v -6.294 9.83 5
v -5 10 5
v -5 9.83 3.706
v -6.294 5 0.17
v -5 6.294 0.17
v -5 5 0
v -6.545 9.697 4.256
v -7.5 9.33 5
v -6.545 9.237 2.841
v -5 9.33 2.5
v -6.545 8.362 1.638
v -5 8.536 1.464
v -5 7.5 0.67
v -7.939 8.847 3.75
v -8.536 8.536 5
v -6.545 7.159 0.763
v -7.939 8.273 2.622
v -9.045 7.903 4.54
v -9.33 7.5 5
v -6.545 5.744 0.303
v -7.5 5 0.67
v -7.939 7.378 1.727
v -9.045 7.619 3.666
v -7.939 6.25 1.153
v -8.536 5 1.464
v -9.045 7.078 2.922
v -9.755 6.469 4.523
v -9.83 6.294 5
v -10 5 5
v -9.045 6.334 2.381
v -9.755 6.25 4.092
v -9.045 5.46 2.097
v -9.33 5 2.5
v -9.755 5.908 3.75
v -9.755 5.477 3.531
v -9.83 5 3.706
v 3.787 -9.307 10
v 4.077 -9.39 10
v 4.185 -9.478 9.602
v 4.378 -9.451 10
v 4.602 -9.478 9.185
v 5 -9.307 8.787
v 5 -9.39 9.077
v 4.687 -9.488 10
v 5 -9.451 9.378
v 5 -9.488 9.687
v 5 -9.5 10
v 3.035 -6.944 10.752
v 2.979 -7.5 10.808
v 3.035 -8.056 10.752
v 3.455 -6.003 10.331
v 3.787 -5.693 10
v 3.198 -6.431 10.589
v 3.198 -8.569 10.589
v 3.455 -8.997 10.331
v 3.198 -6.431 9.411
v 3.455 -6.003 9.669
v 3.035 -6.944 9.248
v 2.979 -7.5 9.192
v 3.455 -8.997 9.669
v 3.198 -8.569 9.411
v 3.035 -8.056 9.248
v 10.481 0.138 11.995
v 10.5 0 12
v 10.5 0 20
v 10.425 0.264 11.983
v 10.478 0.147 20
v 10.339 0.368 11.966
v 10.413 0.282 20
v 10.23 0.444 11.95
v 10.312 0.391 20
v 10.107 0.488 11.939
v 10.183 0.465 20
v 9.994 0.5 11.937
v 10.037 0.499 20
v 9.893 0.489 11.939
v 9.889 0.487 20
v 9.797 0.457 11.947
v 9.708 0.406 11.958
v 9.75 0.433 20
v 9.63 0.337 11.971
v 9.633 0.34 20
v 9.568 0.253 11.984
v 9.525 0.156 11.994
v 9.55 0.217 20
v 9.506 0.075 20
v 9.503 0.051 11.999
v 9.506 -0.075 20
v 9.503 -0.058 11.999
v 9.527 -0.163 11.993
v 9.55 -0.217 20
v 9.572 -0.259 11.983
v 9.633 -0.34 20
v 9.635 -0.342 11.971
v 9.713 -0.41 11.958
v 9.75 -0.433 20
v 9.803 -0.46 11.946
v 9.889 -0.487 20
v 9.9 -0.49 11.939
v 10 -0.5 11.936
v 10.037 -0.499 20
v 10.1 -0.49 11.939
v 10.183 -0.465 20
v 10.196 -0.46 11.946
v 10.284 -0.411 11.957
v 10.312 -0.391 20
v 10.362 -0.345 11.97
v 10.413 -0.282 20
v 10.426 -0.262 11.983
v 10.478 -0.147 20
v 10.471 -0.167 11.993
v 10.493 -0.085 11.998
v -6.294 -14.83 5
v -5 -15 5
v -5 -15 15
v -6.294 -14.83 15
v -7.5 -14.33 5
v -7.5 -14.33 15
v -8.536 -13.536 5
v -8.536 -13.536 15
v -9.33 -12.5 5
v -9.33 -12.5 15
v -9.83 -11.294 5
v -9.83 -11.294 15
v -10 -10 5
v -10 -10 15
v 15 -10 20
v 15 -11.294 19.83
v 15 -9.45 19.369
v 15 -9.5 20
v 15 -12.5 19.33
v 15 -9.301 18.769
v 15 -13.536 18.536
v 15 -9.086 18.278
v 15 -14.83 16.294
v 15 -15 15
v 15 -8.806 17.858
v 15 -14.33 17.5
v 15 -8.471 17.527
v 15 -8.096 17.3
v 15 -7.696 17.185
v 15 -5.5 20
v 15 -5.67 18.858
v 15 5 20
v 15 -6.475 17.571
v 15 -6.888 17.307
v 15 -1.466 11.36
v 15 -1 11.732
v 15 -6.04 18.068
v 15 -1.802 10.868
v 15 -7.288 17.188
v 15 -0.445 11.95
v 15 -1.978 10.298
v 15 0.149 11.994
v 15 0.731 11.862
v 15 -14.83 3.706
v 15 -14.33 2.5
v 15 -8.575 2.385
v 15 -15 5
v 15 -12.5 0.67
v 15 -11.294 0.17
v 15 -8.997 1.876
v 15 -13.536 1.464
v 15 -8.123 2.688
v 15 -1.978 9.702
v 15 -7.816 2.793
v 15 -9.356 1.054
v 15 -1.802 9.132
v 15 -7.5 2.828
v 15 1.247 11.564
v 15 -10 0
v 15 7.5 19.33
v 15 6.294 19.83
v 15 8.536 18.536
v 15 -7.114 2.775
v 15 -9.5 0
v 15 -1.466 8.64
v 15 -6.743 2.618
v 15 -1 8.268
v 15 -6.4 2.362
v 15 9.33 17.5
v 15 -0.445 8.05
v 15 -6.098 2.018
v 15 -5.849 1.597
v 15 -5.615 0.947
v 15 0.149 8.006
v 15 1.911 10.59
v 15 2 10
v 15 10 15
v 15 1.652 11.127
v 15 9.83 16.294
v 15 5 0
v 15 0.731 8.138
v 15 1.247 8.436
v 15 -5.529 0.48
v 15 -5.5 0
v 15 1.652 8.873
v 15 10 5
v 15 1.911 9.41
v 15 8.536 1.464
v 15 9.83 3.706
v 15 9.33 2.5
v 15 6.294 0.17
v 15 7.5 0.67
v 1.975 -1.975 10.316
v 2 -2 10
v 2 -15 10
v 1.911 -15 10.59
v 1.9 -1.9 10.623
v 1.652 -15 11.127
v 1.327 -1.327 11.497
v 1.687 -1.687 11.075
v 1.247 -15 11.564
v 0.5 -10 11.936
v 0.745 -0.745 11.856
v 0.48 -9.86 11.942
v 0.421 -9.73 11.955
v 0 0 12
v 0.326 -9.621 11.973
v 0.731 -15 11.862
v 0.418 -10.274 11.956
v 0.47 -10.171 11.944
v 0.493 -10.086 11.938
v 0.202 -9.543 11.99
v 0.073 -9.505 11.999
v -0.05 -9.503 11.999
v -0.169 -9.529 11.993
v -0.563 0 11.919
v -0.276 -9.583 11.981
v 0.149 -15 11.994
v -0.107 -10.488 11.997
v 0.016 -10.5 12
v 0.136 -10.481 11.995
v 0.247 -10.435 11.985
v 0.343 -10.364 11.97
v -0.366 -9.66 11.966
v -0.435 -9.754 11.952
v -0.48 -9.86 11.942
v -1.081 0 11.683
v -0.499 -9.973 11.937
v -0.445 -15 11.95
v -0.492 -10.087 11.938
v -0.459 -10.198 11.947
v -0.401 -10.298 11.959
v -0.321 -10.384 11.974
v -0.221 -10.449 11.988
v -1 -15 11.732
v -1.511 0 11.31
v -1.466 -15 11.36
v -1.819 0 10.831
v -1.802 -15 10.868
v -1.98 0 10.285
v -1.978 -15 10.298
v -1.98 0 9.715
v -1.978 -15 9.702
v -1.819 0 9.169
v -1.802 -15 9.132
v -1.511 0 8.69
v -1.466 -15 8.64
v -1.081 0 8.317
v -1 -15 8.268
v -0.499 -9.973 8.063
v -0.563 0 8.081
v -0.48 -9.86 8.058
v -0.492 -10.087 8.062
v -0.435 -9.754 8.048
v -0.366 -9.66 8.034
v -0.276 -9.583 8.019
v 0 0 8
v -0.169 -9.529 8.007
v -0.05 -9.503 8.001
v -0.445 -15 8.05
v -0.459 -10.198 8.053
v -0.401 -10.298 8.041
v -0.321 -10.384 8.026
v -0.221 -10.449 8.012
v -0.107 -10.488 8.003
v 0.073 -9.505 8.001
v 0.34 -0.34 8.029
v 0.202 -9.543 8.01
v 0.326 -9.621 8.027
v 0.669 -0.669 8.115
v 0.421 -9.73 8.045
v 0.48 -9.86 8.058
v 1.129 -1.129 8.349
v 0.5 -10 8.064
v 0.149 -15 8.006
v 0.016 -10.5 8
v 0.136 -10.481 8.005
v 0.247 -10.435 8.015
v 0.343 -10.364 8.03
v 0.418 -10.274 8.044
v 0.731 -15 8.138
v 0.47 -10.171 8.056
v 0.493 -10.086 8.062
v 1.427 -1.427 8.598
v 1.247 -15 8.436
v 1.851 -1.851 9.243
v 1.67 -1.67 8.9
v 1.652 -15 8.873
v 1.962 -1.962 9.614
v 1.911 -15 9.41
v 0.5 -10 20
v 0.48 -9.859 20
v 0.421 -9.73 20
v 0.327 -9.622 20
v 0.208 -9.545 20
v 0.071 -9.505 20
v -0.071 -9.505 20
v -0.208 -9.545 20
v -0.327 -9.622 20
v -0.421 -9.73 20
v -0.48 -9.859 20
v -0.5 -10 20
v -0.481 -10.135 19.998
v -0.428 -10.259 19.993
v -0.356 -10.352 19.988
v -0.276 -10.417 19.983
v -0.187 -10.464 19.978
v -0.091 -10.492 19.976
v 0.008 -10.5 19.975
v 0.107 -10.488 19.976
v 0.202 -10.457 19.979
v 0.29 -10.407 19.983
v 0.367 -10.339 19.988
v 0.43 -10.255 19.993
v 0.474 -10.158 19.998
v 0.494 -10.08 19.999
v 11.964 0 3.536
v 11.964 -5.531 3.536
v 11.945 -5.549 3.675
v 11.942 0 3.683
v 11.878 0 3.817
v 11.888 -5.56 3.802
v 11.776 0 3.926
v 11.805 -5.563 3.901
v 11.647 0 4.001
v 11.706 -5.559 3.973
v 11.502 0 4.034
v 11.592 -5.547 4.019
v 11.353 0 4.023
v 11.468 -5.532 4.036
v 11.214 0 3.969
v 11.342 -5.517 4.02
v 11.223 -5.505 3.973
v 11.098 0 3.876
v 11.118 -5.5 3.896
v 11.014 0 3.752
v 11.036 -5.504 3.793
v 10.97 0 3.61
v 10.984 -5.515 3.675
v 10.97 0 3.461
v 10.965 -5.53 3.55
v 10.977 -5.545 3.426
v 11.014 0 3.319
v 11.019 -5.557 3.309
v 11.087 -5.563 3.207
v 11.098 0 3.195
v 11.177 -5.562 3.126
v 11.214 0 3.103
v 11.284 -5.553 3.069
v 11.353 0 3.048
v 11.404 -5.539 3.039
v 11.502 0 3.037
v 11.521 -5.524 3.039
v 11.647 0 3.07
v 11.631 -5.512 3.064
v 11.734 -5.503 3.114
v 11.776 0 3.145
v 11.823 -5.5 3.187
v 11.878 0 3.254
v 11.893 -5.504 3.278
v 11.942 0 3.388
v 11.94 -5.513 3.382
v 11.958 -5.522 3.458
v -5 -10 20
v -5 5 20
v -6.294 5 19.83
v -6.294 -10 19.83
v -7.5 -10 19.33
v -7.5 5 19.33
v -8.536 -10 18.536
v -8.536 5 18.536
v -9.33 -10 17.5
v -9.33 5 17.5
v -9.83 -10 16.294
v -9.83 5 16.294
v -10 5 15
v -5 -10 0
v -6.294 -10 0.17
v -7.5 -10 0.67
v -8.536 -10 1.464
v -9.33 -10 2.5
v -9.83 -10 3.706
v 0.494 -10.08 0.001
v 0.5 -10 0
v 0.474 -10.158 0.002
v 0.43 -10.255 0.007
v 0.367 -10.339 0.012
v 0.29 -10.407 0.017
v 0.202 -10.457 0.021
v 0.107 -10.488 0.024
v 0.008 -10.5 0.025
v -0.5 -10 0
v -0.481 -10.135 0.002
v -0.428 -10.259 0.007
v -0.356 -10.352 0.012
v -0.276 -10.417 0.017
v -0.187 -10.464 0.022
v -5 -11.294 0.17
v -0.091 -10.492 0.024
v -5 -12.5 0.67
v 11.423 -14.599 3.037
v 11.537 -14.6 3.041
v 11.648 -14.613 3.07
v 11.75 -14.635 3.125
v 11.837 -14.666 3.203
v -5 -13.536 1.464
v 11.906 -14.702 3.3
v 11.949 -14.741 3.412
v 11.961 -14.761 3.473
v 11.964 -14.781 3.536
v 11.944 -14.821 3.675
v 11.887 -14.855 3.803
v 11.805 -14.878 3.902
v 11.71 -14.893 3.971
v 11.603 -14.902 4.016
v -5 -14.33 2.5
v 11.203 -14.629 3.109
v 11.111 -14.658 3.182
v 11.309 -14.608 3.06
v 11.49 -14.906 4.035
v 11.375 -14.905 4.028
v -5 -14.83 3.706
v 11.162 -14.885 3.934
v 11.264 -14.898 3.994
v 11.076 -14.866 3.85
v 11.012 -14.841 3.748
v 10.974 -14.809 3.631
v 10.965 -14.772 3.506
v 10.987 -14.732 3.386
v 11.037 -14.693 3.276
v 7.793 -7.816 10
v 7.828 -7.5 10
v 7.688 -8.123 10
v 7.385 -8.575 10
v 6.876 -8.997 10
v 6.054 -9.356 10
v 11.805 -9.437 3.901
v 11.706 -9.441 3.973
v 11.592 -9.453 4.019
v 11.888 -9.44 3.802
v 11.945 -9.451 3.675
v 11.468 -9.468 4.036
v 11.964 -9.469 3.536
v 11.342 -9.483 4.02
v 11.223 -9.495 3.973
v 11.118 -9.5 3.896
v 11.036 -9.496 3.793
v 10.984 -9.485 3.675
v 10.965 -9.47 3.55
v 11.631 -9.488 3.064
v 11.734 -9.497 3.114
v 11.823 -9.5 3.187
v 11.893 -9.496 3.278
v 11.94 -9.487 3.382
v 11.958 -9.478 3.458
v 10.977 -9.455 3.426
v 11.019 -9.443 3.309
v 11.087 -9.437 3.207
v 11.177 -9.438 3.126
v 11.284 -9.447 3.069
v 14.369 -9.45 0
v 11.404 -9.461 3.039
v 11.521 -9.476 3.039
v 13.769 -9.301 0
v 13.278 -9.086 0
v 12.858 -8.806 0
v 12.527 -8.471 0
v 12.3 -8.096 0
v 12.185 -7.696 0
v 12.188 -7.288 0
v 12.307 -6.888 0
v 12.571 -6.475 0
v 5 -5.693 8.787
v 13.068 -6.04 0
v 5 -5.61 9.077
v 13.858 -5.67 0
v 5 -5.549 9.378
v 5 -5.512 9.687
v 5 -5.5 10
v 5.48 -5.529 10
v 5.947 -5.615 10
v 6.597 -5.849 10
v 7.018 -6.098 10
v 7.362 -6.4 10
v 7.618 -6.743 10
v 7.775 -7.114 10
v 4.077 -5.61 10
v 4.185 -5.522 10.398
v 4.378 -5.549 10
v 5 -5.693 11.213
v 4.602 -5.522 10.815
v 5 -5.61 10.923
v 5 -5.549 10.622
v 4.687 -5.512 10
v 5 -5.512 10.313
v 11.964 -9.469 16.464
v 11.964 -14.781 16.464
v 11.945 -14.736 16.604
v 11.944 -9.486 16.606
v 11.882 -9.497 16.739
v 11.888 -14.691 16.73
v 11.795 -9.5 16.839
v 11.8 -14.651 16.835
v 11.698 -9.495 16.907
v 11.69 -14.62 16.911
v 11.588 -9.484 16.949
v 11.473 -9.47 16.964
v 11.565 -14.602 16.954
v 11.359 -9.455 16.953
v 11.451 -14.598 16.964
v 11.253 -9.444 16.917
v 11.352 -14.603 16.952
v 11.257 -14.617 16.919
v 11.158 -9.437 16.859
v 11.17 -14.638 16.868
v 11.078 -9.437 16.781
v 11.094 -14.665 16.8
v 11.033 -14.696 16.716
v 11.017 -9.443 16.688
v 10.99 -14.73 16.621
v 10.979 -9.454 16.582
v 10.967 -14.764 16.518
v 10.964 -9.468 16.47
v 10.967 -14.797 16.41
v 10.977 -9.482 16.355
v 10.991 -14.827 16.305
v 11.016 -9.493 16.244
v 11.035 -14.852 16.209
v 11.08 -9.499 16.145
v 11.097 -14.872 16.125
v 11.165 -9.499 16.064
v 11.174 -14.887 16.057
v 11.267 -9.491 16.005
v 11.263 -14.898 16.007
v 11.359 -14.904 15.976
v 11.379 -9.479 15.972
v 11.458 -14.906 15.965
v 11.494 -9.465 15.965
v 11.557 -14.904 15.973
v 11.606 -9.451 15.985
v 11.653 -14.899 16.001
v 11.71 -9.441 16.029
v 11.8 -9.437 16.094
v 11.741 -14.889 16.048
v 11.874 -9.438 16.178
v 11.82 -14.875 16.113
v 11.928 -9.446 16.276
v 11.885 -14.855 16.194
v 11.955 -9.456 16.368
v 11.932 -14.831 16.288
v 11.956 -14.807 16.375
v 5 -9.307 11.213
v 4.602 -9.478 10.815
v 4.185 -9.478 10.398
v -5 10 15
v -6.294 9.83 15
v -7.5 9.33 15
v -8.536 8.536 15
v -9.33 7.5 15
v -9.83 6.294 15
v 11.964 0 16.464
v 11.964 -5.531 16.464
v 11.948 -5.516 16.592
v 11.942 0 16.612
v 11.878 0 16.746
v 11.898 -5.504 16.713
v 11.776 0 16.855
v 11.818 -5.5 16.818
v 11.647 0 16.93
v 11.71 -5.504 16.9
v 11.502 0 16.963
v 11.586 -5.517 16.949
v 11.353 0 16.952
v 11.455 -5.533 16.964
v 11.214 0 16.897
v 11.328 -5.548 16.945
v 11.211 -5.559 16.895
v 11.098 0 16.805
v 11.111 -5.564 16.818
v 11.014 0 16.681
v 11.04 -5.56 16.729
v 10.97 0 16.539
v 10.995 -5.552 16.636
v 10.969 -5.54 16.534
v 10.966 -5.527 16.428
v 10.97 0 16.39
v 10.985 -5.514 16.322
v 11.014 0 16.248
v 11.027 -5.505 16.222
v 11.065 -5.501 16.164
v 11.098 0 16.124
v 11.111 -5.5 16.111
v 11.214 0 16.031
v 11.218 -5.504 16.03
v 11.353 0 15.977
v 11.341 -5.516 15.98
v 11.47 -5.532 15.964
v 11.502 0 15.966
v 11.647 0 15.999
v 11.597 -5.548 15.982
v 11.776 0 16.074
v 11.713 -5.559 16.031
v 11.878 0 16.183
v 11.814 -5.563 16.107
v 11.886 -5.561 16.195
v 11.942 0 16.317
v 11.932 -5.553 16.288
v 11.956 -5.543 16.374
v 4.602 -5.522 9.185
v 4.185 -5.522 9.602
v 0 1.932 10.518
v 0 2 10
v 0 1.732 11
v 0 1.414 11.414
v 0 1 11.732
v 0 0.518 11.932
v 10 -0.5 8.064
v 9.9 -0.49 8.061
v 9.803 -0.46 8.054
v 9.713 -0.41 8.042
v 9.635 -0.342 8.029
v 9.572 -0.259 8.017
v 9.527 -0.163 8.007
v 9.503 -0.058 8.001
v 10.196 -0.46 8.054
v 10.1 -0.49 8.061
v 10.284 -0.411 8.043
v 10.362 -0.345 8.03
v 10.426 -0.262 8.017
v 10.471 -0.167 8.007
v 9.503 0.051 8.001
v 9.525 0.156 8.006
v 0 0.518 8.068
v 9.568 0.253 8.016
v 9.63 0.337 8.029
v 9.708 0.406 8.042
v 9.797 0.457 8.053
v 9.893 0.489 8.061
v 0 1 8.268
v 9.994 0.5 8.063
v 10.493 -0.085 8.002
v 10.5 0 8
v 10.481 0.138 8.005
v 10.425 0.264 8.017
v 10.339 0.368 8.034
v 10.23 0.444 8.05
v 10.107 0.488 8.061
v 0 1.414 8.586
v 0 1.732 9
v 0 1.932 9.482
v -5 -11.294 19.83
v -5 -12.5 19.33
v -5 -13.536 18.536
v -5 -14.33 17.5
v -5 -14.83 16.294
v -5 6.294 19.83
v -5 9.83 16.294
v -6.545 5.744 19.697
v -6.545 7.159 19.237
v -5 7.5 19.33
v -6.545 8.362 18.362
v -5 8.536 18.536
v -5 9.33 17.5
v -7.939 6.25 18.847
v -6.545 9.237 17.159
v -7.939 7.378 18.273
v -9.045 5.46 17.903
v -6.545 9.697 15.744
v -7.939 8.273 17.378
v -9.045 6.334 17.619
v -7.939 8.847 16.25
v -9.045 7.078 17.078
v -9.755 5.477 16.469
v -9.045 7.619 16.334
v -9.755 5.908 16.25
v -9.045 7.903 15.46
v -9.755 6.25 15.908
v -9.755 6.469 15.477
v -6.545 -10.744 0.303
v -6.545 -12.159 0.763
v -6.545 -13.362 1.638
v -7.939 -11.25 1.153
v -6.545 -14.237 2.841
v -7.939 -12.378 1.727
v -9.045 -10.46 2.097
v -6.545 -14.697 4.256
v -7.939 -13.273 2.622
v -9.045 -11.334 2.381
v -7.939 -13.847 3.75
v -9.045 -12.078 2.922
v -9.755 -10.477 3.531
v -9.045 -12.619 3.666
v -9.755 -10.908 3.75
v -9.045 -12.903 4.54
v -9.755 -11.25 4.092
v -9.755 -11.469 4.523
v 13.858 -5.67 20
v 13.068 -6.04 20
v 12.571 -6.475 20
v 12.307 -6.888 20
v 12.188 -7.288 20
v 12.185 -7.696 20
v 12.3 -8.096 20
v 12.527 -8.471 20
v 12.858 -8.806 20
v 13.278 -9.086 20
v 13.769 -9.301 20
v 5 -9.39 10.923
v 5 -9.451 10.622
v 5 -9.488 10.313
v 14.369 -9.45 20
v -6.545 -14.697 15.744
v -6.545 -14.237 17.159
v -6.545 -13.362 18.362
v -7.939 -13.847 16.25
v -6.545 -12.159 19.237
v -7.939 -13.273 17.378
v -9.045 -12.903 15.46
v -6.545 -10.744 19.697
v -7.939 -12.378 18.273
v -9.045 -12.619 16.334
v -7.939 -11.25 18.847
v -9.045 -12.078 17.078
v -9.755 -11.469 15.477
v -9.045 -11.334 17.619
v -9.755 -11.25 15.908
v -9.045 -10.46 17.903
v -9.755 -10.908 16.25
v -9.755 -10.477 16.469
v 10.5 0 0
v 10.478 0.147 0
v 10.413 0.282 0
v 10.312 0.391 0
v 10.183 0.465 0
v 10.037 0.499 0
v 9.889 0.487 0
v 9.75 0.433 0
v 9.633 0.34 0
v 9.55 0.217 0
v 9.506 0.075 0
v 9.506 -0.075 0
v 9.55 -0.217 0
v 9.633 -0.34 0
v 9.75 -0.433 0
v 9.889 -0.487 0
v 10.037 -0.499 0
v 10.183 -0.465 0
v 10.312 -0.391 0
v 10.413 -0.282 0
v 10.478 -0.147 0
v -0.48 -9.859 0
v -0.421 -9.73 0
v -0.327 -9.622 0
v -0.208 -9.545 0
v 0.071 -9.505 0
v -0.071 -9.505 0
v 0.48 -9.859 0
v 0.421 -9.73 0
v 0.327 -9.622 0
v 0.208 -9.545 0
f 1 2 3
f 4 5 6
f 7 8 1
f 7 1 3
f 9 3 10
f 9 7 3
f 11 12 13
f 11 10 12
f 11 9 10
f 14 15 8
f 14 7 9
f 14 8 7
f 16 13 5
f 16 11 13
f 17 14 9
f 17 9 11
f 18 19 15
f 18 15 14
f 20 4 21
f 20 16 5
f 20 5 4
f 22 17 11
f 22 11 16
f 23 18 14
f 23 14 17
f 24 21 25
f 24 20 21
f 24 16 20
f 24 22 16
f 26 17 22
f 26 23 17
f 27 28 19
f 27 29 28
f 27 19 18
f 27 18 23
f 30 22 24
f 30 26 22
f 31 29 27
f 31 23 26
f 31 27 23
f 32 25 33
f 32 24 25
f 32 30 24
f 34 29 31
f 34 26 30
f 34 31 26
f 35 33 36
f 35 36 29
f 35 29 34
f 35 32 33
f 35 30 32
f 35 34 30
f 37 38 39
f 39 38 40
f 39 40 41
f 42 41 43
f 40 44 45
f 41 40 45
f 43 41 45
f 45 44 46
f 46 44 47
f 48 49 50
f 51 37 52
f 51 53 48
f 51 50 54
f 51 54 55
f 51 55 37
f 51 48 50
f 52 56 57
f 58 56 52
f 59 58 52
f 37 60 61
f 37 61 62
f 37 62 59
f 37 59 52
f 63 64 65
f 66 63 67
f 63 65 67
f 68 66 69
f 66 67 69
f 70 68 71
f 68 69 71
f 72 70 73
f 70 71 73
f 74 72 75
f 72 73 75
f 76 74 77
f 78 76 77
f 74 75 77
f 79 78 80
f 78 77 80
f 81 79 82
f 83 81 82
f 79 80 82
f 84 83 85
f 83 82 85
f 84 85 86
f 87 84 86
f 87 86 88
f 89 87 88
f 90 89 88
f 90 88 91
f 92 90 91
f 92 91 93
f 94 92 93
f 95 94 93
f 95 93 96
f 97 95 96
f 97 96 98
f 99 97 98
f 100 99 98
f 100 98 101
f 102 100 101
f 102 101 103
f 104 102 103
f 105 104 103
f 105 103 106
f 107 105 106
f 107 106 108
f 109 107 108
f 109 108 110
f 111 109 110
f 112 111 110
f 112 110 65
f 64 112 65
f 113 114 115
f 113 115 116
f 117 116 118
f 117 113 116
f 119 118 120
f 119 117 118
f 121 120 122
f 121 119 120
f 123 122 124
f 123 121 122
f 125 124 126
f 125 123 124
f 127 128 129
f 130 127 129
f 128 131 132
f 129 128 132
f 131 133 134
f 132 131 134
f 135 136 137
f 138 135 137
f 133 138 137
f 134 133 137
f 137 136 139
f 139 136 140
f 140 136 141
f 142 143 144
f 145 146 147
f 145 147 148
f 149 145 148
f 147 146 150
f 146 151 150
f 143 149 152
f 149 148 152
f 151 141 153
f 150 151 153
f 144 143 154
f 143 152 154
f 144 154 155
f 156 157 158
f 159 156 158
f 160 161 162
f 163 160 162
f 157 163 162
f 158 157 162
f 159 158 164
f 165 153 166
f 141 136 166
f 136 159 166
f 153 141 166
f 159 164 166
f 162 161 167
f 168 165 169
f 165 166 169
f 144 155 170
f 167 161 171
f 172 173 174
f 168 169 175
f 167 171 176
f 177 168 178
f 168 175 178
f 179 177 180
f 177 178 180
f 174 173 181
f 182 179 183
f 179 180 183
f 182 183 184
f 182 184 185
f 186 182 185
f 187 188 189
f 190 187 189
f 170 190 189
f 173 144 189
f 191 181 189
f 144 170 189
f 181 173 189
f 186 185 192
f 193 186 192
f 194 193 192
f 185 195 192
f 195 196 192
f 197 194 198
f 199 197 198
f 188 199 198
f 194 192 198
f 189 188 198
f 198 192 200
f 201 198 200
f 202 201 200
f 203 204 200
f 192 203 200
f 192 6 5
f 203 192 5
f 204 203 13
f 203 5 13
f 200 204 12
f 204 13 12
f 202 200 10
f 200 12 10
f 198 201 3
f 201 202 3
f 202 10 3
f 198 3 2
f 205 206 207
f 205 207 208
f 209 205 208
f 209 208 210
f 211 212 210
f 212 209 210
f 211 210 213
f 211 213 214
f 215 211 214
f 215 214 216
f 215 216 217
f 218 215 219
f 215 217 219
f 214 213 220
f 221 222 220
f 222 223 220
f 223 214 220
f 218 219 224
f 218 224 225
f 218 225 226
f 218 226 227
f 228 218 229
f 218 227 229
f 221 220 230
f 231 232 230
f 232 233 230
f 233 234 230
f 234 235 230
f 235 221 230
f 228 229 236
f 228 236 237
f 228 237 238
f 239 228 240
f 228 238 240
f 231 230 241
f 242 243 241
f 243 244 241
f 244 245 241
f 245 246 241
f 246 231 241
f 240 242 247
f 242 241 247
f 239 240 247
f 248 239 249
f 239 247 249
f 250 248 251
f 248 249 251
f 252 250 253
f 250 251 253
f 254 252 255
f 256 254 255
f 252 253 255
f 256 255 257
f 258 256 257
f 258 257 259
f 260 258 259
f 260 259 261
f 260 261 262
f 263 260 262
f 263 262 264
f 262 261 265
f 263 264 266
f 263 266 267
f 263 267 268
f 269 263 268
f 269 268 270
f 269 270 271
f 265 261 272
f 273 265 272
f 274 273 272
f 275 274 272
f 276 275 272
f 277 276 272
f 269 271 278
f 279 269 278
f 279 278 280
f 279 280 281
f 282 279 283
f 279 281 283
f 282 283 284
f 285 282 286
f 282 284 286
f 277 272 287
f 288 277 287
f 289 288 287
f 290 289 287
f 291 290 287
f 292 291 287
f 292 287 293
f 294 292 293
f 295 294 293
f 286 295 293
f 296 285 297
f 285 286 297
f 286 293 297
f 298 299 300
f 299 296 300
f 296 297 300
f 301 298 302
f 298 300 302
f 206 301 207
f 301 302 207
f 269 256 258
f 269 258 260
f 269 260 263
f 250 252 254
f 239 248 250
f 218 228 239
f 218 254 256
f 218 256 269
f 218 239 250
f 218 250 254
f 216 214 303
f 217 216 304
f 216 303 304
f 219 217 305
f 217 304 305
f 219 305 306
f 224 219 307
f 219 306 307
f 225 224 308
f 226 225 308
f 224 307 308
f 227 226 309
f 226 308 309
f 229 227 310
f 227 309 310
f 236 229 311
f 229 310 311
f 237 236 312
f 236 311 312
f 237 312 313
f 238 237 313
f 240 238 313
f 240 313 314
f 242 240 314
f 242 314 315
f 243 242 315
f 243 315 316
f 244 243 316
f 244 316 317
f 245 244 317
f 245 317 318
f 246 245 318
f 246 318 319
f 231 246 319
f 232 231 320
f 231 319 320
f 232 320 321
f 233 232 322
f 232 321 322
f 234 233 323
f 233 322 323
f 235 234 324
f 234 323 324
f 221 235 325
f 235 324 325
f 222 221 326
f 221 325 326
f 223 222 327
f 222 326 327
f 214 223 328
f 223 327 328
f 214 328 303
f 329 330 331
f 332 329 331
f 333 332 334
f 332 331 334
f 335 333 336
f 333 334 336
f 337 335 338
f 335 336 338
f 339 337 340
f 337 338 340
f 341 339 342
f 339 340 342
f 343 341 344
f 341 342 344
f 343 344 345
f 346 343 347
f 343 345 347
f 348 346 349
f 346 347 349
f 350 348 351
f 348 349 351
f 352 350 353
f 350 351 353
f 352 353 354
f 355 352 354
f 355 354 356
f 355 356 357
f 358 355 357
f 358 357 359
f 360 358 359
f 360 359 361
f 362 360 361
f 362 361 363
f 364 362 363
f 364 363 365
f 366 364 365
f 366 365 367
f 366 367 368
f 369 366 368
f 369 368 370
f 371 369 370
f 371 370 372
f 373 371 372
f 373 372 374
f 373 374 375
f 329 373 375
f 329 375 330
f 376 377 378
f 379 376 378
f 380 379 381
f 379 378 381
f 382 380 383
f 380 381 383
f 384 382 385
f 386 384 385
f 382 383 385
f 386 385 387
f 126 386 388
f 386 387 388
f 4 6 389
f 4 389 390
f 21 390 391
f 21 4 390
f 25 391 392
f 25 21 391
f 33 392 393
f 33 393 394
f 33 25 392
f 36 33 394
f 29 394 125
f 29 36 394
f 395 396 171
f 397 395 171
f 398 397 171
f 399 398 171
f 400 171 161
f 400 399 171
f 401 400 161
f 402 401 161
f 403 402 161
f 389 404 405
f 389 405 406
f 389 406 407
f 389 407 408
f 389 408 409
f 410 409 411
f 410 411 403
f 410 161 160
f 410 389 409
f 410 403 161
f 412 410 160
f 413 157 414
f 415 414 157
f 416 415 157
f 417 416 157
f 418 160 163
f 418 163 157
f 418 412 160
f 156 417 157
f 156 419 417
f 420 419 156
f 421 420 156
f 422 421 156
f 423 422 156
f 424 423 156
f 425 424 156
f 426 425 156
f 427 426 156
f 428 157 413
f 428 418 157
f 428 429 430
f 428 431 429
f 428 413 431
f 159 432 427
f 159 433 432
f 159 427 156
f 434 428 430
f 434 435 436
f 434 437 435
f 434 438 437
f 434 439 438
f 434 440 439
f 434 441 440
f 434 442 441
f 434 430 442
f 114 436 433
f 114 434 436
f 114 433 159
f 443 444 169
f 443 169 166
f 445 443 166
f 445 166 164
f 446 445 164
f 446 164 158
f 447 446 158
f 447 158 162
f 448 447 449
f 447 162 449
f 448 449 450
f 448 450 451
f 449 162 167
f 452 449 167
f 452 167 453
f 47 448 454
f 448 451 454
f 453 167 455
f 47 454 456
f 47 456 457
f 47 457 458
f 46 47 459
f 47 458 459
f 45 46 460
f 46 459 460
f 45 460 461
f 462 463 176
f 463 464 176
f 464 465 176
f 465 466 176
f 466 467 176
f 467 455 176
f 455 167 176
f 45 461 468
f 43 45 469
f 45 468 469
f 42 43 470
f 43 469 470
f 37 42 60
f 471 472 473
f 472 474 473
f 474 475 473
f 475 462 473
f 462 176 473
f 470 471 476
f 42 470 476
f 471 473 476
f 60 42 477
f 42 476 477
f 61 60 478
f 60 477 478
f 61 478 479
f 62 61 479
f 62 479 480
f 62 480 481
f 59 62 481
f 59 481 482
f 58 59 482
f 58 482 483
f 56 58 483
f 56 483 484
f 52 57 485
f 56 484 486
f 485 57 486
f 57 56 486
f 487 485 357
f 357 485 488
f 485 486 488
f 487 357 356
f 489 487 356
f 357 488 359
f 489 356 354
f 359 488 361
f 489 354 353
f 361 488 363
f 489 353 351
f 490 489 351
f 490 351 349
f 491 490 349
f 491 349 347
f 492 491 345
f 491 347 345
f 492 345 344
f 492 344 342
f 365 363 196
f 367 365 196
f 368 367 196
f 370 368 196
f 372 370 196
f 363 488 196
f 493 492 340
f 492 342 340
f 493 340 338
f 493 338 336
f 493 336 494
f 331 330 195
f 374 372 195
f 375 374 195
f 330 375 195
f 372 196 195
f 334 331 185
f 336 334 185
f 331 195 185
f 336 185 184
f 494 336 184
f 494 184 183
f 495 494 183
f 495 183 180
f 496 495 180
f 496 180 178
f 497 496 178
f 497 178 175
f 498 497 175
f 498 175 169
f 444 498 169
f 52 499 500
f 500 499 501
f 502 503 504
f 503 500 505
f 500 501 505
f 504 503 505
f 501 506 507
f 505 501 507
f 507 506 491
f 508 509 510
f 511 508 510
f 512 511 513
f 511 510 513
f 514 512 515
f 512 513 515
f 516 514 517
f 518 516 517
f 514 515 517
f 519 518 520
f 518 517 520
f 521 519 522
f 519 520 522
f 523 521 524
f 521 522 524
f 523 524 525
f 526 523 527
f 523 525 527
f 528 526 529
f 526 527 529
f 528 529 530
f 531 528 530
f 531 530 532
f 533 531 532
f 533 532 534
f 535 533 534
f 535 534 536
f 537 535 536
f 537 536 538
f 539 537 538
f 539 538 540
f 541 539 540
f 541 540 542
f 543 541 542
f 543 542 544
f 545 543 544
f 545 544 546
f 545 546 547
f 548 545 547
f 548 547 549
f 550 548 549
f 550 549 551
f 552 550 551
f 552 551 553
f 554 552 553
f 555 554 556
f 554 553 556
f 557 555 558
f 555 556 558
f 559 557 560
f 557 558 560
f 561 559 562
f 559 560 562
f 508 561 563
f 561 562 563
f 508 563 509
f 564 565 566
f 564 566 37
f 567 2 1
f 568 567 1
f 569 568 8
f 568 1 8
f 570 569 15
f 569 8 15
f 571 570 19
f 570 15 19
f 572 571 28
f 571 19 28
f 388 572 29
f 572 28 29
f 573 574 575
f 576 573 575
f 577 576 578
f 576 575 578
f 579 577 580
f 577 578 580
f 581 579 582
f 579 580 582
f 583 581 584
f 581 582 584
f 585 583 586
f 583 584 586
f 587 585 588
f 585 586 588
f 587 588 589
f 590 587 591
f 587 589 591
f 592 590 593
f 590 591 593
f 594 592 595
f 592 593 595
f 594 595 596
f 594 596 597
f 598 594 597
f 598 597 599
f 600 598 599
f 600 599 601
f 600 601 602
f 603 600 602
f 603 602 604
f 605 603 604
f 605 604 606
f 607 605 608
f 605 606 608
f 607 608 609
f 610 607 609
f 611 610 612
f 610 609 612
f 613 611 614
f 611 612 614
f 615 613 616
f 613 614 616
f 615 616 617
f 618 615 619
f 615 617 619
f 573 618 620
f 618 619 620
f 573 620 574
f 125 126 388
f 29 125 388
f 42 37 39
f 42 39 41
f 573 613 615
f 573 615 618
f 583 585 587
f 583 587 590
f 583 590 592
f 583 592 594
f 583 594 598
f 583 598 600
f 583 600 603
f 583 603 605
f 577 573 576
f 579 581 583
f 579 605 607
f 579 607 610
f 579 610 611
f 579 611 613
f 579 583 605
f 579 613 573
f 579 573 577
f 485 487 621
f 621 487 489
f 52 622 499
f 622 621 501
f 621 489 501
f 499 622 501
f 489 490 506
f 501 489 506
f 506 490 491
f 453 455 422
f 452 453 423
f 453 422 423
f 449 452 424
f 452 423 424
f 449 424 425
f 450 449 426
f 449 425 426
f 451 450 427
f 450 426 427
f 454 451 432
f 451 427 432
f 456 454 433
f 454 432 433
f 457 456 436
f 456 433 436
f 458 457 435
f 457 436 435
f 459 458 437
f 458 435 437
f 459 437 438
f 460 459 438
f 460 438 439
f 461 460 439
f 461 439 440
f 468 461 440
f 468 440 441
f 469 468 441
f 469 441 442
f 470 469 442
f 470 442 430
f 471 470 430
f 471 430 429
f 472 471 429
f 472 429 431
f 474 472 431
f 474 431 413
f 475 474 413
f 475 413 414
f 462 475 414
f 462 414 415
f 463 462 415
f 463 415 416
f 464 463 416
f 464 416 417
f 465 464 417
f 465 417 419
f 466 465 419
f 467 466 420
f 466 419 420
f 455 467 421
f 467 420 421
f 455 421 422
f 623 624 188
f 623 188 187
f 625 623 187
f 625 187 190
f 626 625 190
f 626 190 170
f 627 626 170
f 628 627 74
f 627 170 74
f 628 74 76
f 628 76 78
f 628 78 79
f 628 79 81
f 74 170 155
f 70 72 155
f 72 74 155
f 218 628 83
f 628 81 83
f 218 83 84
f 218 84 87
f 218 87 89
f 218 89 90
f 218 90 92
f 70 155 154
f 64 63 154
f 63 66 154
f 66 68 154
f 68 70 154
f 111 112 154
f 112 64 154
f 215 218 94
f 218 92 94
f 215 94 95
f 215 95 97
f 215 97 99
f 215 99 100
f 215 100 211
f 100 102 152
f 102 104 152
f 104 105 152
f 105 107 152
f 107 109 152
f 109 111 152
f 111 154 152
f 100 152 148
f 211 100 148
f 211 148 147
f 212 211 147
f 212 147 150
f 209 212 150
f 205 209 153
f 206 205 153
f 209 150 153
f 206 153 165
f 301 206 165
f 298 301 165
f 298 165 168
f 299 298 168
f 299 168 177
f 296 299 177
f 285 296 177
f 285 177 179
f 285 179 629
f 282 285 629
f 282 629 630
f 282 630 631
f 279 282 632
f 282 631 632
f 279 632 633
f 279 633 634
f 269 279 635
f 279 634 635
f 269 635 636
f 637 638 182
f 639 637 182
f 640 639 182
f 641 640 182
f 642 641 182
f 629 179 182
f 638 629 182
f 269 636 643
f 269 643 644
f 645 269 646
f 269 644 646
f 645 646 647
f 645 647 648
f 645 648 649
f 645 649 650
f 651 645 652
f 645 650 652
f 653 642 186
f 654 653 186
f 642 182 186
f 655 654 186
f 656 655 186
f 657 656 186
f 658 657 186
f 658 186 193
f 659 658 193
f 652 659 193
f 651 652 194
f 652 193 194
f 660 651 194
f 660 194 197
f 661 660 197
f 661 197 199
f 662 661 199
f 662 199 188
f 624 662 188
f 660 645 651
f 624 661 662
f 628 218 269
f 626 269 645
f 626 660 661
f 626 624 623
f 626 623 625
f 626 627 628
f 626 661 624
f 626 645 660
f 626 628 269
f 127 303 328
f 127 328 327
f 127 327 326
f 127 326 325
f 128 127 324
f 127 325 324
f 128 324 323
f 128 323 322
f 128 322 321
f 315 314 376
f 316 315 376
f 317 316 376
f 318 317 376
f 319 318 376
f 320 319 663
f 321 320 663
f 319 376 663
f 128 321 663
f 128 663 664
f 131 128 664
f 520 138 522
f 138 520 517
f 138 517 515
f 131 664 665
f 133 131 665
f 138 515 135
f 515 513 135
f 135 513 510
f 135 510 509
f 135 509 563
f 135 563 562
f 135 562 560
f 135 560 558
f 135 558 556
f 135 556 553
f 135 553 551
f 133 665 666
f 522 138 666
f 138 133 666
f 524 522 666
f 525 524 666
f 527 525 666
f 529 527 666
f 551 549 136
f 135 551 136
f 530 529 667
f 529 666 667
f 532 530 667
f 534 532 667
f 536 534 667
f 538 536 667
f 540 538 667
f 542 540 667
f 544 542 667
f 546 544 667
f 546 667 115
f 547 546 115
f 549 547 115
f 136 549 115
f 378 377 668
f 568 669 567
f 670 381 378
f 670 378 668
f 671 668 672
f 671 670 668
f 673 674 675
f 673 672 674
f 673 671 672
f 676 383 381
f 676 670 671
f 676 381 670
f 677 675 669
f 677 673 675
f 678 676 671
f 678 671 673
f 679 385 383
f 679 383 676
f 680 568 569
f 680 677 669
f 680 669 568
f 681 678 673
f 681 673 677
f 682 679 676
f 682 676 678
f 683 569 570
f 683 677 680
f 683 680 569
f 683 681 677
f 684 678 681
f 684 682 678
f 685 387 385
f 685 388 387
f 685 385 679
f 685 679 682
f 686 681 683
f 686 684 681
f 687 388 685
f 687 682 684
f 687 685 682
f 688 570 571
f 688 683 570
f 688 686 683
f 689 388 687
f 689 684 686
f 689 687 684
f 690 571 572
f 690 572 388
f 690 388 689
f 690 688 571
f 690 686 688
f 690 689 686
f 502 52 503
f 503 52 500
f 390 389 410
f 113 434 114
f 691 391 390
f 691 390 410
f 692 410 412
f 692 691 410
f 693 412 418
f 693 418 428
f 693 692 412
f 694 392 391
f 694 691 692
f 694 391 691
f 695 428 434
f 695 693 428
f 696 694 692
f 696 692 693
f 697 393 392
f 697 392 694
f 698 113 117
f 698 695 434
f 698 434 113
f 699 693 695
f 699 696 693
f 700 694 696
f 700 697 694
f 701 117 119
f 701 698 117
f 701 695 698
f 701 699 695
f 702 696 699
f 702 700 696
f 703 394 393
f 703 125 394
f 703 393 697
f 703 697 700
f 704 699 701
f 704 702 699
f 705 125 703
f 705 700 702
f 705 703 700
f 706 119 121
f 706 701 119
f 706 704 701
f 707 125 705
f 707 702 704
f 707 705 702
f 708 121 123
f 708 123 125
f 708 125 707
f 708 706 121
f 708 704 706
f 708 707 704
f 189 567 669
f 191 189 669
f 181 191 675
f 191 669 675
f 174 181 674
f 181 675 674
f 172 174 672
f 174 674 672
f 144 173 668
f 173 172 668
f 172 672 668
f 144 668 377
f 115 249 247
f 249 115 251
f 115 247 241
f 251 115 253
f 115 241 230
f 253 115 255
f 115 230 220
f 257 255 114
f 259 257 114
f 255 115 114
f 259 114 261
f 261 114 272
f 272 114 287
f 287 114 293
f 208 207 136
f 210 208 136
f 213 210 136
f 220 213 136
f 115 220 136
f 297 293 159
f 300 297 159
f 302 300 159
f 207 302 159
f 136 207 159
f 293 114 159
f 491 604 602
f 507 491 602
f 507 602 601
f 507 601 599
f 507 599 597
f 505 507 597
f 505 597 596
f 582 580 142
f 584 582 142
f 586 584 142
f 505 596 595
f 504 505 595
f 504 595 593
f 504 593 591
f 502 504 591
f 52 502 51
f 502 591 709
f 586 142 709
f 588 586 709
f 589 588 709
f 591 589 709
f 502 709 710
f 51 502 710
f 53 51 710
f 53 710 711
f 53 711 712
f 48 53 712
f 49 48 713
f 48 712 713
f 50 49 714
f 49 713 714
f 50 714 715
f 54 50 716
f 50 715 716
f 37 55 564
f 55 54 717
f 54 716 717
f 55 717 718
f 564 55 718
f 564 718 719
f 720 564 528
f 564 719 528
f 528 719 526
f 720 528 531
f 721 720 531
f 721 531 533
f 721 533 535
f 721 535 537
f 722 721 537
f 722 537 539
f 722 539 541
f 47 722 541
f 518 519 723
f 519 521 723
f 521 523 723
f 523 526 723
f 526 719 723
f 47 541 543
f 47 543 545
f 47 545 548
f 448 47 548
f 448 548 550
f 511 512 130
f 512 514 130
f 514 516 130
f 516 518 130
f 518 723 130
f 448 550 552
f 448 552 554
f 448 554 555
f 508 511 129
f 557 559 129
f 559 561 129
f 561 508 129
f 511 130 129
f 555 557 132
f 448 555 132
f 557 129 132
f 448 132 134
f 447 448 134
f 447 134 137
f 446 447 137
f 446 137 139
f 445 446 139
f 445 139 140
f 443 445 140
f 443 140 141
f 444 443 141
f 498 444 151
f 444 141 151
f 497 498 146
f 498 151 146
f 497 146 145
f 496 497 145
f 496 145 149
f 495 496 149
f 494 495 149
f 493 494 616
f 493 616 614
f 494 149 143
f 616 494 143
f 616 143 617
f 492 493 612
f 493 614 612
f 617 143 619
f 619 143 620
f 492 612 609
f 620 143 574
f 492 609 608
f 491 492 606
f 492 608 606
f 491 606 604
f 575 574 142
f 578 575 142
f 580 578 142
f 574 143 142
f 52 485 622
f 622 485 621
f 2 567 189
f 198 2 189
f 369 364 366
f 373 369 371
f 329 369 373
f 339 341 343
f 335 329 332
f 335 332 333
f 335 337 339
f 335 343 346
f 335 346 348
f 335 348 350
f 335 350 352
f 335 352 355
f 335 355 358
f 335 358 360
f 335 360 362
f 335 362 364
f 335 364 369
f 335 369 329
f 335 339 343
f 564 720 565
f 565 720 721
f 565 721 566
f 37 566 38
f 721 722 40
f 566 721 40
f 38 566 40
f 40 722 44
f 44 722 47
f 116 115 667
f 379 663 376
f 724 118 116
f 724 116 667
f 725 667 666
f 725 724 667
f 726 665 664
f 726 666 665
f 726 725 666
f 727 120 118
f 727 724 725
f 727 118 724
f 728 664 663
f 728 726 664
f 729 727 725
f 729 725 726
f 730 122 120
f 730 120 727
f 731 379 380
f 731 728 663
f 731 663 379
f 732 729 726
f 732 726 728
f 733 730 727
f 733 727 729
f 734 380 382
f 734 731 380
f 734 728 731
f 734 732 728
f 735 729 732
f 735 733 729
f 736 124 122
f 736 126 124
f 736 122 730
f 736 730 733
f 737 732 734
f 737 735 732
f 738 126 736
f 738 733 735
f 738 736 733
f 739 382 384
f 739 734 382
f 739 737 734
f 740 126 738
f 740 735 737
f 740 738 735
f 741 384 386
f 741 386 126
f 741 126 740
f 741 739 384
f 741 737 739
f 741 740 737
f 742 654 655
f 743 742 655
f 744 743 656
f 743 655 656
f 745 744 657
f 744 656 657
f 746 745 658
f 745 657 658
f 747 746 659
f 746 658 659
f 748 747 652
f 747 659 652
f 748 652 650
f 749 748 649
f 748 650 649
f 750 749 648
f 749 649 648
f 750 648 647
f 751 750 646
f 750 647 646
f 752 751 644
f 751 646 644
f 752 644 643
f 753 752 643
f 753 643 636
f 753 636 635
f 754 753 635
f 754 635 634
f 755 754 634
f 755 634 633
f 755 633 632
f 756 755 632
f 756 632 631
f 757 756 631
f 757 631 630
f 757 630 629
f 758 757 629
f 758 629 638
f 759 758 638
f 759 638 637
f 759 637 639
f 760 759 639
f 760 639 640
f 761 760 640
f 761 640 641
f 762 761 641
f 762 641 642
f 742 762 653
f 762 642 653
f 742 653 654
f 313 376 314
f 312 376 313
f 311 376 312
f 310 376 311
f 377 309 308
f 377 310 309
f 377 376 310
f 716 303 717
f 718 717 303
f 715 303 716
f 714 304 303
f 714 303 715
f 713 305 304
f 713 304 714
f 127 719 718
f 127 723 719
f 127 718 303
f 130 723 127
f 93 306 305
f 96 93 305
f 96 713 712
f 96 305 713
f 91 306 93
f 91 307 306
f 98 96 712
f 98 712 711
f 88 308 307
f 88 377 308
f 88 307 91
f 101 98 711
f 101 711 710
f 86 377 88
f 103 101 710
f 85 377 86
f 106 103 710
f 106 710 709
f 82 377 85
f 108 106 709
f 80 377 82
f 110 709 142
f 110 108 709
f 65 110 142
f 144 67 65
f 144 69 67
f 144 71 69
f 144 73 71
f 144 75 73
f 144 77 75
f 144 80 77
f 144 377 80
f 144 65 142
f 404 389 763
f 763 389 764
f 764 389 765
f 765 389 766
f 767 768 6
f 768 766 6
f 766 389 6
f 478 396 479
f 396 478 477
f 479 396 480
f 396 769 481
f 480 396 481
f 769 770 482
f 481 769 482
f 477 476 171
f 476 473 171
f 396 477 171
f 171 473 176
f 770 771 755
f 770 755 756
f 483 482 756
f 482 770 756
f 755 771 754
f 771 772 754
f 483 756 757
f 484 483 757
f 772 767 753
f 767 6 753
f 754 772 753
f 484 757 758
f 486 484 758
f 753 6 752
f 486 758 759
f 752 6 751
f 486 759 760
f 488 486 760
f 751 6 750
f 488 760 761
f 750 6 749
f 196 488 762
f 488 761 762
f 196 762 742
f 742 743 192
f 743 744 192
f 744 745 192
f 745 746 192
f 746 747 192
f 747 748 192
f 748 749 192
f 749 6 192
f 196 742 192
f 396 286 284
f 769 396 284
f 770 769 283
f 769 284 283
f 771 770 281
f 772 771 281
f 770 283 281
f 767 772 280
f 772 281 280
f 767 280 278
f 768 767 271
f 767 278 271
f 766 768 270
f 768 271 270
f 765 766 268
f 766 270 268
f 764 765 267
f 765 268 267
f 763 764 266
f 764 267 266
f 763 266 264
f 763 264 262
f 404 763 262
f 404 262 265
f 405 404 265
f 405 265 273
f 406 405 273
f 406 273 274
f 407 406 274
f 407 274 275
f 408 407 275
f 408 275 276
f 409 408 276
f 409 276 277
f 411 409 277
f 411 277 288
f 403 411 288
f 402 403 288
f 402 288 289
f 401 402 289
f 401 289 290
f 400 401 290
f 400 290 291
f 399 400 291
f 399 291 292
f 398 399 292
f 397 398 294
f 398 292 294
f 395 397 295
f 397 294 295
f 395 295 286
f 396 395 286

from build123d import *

# Parameters (mm, degrees)
F0_W          = 30
F0_H          = 30
F1_DEPTH      = 20
F2_R          = 2
F3_DEPTH      = 15
F4_R          = 2
F4_R_2        = 0.5
F5_DEPTH      = 15
F7_R          = 2
F8_DEPTH      = 15
F10_R         = 2
F11_DEPTH     = 15
F12_R         = 0.5
F13_DEPTH     = 20.0010001
F14_T1_DEPTH  = 10
F14_T3_DEPTH  = 32.5
F14_T5_DEPTH  = 15
F14_S9_W      = 5
F14_S9_H      = 5
F14_T10_DEPTH = 5
F14_S15_W     = 5
F14_S15_H     = 5
F14_T16_DEPTH = 5
F14_S21_W     = 5
F14_S21_H     = 5
F14_T22_DEPTH = 5
F14_S27_W     = 5
F14_S27_H     = 5
F14_T28_DEPTH = 5


# Not quite as in the source:
# - a fillet or chamfer that OpenCascade refuses, or shapes differently, is made with other operations: its cross-section is extruded or revolved along the edge and cut away or added


with BuildPart() as f1:
    # F0 (on Top) → F1 (new body)
    with BuildSketch(Plane.XY):
        Rectangle(F0_W, F0_H)
    extrude(amount=F1_DEPTH)

    # F2 (on face) → F3 (cut)
    with BuildSketch(Plane.YZ.offset(15)):
        with Locations((0, 10)):
            Circle(F2_R)
    extrude(amount=-F3_DEPTH, mode=Mode.SUBTRACT)

    # F4 (on face) → F5 (cut)
    with BuildSketch(Plane.XZ.offset(15)):
        with Locations((0, 10)):
            Circle(F4_R)
        with Locations((11.4644660941, 16.4644660941)):
            Circle(F4_R_2)
        with Locations((11.4644660941, 3.5355339059)):
            Circle(F4_R_2)
    extrude(amount=-F5_DEPTH, mode=Mode.SUBTRACT)

    # F7 (on face) → F8 (cut)
    with BuildSketch(Plane(origin=(17.5, 0, 17.5), x_dir=(0, 1, 0), z_dir=(0.7071067812, 0, 0.7071067812))):
        with Locations((-7.5, 3.5355339059)):
            Circle(F7_R)
    extrude(amount=-F8_DEPTH, mode=Mode.SUBTRACT)

    # F10 (on face) → F11 (cut)
    with BuildSketch(Plane(origin=(7.5, 0, -7.5), x_dir=(0.7071067812, 0, 0.7071067812), z_dir=(0.7071067812, 0, -0.7071067812))):
        with Locations((10.6066017178, 7.5)):
            Circle(F10_R)
    extrude(amount=-F11_DEPTH, mode=Mode.SUBTRACT)

    # F12 (on face) → F13 (cut, through all)
    with BuildSketch(Plane.XY.offset(20)):
        Polygon((-60, -15), (-10, -15), (-10, 10), (15, 10), (15, 50), (-60, 50), align=None)
        with Locations((10, 0)):
            Circle(F12_R)
        with Locations((0, -10)):
            Circle(F12_R)
    extrude(amount=-F13_DEPTH, mode=Mode.SUBTRACT)

    # F14: fillet of radius 5 on 8 edges, made by hand

    # F14_s2 → F14_t1 (cut)
    with BuildSketch(Plane.XY.offset(5)):
        with BuildLine():
            ThreePointArc((-5, -15), (-8.5355339059, -13.5355339059), (-10, -10))
            Line((-10, -10), (-10, -15))
            Line((-10, -15), (-5, -15))
        make_face()
        with BuildLine():
            ThreePointArc((-5, 10), (-8.5355339059, 8.5355339059), (-10, 5))
            Line((-10, 5), (-10, 10))
            Line((-10, 10), (-5, 10))
        make_face()
    extrude(amount=F14_T1_DEPTH, mode=Mode.SUBTRACT)

    # F14_s4 → F14_t3 (cut)
    with BuildSketch(Plane.YZ.offset(-5)):
        with BuildLine():
            ThreePointArc((-10, 20), (-13.5355339059, 18.5355339059), (-15, 15))
            Line((-15, 15), (-15, 20))
            Line((-15, 20), (-10, 20))
        make_face()
        with BuildLine():
            ThreePointArc((10, 15), (8.5355339059, 18.5355339059), (5, 20))
            Line((5, 20), (10, 20))
            Line((10, 20), (10, 15))
        make_face()
        with BuildLine():
            ThreePointArc((5, 0), (8.5355339059, 1.4644660941), (10, 5))
            Line((10, 5), (10, 0))
            Line((10, 0), (5, 0))
        make_face()
        with BuildLine():
            ThreePointArc((-10, 0), (-13.5355339059, 1.4644660941), (-15, 5))
            Line((-15, 5), (-15, 0))
            Line((-15, 0), (-10, 0))
        make_face()
    extrude(amount=F14_T3_DEPTH, mode=Mode.SUBTRACT)

    # F14_s6 → F14_t5 (cut)
    with BuildSketch(Plane.XZ.offset(-5)):
        with BuildLine():
            ThreePointArc((-5, 20), (-8.5355339059, 18.5355339059), (-10, 15))
            Line((-10, 15), (-10, 20))
            Line((-10, 20), (-5, 20))
        make_face()
        with BuildLine():
            ThreePointArc((-5, 0), (-8.5355339059, 1.4644660941), (-10, 5))
            Line((-10, 5), (-10, 0))
            Line((-10, 0), (-5, 0))
        make_face()
    extrude(amount=F14_T5_DEPTH, mode=Mode.SUBTRACT)


with BuildPart() as f14_tool8:
    # F14_s9 → F14_t10 (new body)
    with BuildSketch(Plane.YZ.offset(-5)):
        with Locations((-12.5, 17.5)):
            Rectangle(F14_S9_W, F14_S9_H)
    extrude(amount=-F14_T10_DEPTH)

    # F14_s11 → F14_t12 (revolve, cut)
    with BuildSketch(Plane(origin=(-5, -10, 15), x_dir=(0, 0.7071067812, -0.7071067812), z_dir=(0, 0.7071067812, 0.7071067812))):
        with BuildLine():
            ThreePointArc((0, -5), (5, 0), (0, 5))
            Line((0, 5), (0, -5))
        make_face()
    revolve(axis=Axis((-5, -10, 15), (-1, 0, 0)), mode=Mode.SUBTRACT)


with BuildPart() as f1_1:
    add(f1.part)

    # F14_t7: cut F14_tool8
    add(f14_tool8.part, mode=Mode.SUBTRACT)


with BuildPart() as f14_tool14:
    # F14_s15 → F14_t16 (new body)
    with BuildSketch(Plane.YZ.offset(-5)):
        with Locations((-12.5, 2.5)):
            Rectangle(F14_S15_W, F14_S15_H)
    extrude(amount=-F14_T16_DEPTH)

    # F14_s17 → F14_t18 (revolve, cut)
    with BuildSketch(Plane(origin=(-5, -10, 5), x_dir=(0, 0.7071067812, 0.7071067812), z_dir=(0, -0.7071067812, 0.7071067812))):
        with BuildLine():
            ThreePointArc((0, -5), (5, 0), (0, 5))
            Line((0, 5), (0, -5))
        make_face()
    revolve(axis=Axis((-5, -10, 5), (-1, 0, 0)), mode=Mode.SUBTRACT)


with BuildPart() as f1_2:
    add(f1_1.part)

    # F14_t13: cut F14_tool14
    add(f14_tool14.part, mode=Mode.SUBTRACT)


with BuildPart() as f14_tool20:
    # F14_s21 → F14_t22 (new body)
    with BuildSketch(Plane.YZ.offset(-5)):
        with Locations((7.5, 17.5)):
            Rectangle(F14_S21_W, F14_S21_H)
    extrude(amount=-F14_T22_DEPTH)

    # F14_s23 → F14_t24 (revolve, cut)
    with BuildSketch(Plane(origin=(-5, 5, 15), x_dir=(0, -0.7071067812, -0.7071067812), z_dir=(0, 0.7071067812, -0.7071067812))):
        with BuildLine():
            ThreePointArc((0, -5), (5, 0), (0, 5))
            Line((0, 5), (0, -5))
        make_face()
    revolve(axis=Axis((-5, 5, 15), (-1, 0, 0)), mode=Mode.SUBTRACT)


with BuildPart() as f1_3:
    add(f1_2.part)

    # F14_t19: cut F14_tool20
    add(f14_tool20.part, mode=Mode.SUBTRACT)


with BuildPart() as f14_tool26:
    # F14_s27 → F14_t28 (new body)
    with BuildSketch(Plane.YZ.offset(-5)):
        with Locations((7.5, 2.5)):
            Rectangle(F14_S27_W, F14_S27_H)
    extrude(amount=-F14_T28_DEPTH)

    # F14_s29 → F14_t30 (revolve, cut)
    with BuildSketch(Plane(origin=(-5, 5, 5), x_dir=(0, -0.7071067812, 0.7071067812), z_dir=(0, -0.7071067812, -0.7071067812))):
        with BuildLine():
            ThreePointArc((0, -5), (5, 0), (0, 5))
            Line((0, 5), (0, -5))
        make_face()
    revolve(axis=Axis((-5, 5, 5), (-1, 0, 0)), mode=Mode.SUBTRACT)


with BuildPart() as f1_4:
    add(f1_3.part)

    # F14_t25: cut F14_tool26
    add(f14_tool26.part, mode=Mode.SUBTRACT)


solid = f1_4.part
